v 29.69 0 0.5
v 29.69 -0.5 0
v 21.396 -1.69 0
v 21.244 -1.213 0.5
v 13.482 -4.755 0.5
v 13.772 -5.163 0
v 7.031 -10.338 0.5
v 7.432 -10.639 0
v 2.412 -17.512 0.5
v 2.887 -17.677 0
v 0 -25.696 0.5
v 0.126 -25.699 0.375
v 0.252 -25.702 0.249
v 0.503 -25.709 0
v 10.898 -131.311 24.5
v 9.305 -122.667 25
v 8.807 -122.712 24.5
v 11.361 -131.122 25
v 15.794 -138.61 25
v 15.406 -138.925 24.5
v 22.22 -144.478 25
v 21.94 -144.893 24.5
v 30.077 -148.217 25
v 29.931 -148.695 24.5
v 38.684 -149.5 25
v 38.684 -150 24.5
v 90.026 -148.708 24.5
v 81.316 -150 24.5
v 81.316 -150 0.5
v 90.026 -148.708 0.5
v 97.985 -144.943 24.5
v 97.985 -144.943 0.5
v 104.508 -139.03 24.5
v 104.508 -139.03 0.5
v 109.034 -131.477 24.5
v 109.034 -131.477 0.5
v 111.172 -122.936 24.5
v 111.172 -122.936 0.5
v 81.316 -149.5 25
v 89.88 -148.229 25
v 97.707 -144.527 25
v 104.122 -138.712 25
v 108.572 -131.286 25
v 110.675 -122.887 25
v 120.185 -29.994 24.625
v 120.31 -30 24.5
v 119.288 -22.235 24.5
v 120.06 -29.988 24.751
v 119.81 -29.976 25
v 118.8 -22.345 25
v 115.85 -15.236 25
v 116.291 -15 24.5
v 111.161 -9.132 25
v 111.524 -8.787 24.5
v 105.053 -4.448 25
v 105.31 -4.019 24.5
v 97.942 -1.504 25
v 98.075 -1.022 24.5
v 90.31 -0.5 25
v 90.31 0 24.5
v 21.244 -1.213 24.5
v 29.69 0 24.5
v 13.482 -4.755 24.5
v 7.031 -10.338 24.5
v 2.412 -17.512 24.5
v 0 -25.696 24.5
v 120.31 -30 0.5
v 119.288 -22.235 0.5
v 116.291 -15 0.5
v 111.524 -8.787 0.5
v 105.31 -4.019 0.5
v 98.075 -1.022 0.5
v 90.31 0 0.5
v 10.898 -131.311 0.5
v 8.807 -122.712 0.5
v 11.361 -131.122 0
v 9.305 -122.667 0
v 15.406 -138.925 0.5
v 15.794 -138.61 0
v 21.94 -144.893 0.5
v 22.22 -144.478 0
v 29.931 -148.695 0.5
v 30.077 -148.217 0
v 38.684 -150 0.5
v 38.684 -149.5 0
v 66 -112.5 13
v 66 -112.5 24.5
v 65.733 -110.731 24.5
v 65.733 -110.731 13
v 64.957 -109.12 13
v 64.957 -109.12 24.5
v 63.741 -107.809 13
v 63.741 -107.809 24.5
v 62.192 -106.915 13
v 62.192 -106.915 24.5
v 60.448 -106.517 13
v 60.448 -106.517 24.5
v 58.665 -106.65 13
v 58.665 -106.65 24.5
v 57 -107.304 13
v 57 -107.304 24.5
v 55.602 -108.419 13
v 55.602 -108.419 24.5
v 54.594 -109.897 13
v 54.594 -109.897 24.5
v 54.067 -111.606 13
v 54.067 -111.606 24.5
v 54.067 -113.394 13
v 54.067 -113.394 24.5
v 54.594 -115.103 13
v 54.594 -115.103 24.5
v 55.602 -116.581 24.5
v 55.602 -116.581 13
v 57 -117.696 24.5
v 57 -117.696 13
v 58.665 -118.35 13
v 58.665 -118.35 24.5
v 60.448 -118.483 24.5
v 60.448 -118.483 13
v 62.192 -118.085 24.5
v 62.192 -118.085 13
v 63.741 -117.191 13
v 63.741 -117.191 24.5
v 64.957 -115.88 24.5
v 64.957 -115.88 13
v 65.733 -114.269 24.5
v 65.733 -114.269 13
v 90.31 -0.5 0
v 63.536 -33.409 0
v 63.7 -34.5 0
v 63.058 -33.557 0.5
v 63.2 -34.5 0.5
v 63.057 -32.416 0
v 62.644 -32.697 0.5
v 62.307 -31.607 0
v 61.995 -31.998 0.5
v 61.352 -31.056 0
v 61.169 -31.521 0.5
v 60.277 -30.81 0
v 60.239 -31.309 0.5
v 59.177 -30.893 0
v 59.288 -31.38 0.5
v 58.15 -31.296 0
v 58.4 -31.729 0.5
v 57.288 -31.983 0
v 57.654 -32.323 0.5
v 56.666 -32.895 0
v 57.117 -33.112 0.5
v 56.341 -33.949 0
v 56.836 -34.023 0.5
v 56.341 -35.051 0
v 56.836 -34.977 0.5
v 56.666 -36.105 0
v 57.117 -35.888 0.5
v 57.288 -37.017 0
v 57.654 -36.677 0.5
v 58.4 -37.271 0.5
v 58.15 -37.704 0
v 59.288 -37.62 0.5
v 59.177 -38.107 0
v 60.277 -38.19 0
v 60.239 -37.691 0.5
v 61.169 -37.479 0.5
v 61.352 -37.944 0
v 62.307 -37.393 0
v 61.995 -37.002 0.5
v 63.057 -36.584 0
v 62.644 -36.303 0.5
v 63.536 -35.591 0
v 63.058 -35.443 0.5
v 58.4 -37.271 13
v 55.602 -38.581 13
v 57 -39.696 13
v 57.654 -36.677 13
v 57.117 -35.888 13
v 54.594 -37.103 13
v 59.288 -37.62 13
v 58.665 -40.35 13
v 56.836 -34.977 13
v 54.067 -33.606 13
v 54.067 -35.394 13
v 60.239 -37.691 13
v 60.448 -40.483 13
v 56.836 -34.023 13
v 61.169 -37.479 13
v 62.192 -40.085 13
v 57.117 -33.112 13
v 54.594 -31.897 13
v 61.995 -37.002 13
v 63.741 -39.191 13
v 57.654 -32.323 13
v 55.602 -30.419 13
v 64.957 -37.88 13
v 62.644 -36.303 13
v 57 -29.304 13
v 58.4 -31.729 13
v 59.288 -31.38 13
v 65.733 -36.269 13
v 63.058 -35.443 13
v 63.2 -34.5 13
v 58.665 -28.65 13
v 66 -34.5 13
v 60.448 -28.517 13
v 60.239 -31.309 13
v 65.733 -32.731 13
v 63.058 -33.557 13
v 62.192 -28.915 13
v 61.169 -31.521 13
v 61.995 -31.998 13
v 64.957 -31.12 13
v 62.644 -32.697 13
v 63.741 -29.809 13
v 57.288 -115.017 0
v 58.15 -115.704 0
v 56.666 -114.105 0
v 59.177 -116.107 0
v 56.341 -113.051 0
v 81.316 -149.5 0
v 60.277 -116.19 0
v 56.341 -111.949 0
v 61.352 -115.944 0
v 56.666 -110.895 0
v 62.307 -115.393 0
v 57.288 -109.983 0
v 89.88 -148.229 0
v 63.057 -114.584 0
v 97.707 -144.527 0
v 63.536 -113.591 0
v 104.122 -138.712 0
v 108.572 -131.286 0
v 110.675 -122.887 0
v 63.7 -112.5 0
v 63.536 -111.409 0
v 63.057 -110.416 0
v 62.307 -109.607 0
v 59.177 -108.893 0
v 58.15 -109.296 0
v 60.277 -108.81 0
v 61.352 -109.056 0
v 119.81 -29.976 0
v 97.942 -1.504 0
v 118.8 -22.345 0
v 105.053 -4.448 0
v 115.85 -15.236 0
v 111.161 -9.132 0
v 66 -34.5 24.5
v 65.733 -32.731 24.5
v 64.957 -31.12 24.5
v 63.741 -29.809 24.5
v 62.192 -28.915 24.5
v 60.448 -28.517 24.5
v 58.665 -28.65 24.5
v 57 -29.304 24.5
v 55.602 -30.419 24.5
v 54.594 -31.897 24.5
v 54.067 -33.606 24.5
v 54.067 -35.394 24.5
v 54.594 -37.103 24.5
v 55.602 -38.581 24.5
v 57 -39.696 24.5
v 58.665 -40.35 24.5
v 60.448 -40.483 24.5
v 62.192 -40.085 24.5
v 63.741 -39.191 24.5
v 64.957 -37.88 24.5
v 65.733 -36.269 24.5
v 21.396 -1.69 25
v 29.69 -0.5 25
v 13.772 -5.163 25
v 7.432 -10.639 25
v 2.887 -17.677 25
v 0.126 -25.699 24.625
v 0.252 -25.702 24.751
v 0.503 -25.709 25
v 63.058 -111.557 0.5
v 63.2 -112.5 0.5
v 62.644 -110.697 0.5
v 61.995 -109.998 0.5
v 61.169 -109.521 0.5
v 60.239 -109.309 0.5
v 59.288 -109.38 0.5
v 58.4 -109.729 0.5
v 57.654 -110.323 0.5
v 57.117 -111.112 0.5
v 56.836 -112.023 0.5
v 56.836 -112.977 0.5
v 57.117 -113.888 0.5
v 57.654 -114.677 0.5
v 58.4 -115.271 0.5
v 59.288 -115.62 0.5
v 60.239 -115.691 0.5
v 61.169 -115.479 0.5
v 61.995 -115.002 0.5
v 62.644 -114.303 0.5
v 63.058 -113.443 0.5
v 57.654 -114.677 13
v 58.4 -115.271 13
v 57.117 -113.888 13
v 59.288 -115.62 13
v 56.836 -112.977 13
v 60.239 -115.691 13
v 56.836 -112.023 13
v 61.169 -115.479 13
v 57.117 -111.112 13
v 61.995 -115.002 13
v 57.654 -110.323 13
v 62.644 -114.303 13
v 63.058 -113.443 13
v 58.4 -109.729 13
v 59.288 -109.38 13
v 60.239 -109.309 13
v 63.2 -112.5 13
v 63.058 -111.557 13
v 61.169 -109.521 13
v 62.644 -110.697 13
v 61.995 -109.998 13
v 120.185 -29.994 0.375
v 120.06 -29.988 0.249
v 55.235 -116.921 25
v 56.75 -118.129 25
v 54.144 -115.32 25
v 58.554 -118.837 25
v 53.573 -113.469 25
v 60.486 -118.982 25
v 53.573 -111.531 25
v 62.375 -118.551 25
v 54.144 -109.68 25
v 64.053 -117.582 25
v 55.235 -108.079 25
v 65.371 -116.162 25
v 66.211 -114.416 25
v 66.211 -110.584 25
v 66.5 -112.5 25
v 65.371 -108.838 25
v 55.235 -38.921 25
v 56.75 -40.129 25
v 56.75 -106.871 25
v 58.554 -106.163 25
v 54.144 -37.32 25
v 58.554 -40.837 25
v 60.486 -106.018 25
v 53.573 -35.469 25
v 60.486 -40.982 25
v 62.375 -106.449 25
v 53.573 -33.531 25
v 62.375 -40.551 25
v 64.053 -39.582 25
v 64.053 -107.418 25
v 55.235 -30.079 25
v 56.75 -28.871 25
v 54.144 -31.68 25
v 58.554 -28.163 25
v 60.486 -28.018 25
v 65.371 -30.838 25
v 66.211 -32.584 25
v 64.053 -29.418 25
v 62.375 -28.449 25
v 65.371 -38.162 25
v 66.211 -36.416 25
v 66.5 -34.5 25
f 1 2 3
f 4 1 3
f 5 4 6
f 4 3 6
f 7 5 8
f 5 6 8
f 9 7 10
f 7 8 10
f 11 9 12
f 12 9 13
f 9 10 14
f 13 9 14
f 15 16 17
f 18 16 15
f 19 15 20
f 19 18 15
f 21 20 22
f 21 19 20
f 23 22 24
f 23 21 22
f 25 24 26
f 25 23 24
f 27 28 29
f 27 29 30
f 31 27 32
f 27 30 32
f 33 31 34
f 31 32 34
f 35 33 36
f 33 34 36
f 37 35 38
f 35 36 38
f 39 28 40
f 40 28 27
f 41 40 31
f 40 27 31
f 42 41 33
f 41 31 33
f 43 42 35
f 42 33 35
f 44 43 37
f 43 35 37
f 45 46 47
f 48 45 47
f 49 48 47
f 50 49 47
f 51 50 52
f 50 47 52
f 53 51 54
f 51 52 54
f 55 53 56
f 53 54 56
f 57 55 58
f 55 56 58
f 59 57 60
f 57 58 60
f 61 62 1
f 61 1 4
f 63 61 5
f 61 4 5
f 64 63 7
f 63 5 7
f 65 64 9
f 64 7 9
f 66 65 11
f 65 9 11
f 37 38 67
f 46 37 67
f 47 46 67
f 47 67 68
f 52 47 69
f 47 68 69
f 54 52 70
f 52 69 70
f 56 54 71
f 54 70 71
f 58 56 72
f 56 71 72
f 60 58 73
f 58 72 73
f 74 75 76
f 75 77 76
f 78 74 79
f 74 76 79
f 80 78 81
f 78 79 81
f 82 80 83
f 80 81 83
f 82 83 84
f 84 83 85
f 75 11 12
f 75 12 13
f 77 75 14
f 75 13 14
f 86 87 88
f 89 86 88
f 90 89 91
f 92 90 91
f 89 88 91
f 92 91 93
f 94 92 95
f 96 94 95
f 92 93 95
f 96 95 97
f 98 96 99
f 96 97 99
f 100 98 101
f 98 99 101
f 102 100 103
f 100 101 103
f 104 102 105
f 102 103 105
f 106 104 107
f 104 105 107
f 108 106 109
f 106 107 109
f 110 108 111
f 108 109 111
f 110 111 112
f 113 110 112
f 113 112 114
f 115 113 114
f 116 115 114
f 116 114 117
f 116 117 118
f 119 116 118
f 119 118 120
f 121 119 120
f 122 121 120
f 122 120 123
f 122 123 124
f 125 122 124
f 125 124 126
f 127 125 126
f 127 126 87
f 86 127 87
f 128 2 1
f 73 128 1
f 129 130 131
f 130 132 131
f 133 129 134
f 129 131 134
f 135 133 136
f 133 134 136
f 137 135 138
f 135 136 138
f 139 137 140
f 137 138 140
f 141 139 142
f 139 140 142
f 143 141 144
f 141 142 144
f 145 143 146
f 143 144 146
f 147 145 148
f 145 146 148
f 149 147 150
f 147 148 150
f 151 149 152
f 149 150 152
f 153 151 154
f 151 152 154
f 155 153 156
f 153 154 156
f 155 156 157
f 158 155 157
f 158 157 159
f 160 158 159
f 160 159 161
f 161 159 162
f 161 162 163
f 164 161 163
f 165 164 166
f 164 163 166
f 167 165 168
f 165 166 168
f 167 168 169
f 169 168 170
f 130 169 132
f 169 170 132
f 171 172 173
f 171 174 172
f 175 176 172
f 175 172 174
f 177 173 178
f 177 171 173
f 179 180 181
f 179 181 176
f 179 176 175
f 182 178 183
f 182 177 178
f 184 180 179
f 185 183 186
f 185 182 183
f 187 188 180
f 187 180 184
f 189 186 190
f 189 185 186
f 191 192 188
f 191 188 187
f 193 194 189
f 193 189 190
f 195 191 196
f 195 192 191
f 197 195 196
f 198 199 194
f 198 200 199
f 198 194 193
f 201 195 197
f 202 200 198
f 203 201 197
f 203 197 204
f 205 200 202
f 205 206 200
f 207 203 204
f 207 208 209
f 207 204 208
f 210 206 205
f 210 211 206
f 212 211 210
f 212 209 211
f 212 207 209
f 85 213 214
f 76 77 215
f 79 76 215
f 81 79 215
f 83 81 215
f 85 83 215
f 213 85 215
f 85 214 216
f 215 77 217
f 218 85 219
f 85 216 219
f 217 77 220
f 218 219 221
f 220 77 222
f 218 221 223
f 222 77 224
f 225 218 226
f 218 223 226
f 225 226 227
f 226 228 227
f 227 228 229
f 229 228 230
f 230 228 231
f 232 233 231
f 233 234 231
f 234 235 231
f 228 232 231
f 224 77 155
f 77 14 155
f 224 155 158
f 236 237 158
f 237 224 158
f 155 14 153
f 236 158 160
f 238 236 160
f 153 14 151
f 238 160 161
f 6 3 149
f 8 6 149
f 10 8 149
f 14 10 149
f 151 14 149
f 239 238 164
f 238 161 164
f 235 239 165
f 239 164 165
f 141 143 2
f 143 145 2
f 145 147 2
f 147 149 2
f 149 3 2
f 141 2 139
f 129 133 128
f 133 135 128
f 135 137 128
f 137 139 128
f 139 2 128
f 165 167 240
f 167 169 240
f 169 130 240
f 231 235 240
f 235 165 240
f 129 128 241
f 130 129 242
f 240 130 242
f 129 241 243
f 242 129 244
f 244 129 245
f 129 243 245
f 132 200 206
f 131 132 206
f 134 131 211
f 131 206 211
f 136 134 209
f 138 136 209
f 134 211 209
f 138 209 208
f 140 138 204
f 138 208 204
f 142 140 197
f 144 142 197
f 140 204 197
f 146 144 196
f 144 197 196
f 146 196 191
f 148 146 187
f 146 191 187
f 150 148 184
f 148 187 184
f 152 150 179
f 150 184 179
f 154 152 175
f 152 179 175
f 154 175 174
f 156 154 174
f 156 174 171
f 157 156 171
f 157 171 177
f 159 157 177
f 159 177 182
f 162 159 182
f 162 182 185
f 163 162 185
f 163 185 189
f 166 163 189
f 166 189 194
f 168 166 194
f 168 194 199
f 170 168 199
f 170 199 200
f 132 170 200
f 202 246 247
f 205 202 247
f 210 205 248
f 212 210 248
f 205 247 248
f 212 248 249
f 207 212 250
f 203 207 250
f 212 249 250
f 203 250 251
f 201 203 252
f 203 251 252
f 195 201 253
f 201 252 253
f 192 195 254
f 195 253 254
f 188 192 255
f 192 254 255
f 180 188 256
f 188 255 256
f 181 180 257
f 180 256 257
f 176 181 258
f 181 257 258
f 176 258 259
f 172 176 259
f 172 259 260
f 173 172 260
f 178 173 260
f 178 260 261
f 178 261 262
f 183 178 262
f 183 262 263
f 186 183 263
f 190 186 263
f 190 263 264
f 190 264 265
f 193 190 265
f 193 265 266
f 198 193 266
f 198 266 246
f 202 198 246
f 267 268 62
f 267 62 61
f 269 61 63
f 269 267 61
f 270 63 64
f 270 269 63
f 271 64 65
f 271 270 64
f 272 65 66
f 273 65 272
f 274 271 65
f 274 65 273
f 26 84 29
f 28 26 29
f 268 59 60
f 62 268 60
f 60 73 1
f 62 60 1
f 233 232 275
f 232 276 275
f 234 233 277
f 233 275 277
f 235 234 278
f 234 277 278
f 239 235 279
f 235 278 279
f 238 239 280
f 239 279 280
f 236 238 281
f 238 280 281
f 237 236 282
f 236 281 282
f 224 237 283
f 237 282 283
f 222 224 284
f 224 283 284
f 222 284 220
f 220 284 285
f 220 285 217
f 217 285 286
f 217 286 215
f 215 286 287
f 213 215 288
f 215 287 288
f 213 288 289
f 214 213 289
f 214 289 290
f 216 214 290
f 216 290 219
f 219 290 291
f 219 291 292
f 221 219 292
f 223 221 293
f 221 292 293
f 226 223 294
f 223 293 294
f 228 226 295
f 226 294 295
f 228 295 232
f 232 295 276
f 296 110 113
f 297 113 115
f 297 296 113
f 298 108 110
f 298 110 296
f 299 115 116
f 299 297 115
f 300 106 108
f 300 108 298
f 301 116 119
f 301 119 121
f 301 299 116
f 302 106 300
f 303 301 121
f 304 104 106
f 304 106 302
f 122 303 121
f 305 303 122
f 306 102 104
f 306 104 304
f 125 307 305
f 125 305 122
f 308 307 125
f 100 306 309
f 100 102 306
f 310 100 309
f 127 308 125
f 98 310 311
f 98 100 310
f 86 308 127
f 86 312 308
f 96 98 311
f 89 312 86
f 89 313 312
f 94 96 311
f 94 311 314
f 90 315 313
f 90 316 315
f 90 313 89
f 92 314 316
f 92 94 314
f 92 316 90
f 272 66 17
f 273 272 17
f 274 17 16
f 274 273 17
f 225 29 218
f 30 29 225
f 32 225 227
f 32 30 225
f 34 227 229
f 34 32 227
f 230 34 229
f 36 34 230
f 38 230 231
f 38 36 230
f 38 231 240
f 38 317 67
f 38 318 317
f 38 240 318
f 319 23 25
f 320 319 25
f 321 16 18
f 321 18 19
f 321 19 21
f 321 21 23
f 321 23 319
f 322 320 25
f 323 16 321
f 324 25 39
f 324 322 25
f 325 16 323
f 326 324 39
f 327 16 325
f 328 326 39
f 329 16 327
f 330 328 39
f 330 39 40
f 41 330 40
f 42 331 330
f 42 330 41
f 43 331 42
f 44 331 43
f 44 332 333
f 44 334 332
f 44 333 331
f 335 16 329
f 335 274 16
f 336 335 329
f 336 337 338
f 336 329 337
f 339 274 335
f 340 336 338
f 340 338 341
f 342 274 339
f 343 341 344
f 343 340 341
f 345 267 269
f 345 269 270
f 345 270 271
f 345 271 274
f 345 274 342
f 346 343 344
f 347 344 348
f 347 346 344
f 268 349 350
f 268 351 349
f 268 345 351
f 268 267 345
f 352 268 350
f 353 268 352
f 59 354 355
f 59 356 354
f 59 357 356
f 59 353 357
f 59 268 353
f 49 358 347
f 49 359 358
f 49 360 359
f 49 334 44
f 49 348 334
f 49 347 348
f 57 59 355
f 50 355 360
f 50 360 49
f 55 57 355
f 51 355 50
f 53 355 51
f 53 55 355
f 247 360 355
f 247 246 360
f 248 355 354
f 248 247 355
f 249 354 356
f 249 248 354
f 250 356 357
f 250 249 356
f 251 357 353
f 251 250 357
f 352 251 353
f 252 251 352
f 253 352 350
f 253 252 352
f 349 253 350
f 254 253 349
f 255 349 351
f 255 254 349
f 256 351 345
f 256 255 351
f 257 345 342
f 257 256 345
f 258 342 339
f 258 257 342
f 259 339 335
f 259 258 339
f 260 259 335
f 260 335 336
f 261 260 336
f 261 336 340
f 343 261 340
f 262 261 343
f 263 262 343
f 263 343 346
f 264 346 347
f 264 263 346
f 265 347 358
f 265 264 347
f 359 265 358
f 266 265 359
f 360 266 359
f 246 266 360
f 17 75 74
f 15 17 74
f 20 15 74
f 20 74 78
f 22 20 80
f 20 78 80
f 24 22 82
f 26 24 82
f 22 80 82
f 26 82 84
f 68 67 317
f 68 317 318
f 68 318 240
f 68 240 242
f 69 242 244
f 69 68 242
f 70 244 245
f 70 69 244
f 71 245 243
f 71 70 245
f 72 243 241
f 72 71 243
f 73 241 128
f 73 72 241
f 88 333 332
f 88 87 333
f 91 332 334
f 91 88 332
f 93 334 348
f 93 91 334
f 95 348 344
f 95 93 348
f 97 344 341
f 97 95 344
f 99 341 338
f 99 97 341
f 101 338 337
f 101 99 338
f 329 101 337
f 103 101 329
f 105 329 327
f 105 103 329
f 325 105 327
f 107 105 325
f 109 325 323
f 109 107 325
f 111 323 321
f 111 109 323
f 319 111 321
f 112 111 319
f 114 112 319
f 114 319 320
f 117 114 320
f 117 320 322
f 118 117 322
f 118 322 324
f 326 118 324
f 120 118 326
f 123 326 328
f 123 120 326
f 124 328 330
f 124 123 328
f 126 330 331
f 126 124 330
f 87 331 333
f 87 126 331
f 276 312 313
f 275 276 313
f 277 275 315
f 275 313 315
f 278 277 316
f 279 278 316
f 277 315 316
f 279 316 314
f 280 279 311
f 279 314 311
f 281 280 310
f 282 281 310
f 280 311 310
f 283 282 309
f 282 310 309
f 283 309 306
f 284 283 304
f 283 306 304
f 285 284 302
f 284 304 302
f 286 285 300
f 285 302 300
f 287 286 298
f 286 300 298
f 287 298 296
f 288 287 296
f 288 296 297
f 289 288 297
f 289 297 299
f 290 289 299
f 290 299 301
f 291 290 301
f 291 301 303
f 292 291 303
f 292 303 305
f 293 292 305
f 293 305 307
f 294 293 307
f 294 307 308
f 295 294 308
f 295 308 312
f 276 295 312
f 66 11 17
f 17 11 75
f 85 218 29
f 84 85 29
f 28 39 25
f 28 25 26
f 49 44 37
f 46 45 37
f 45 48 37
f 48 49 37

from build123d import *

# Parameters (mm, degrees)
BOSS_EXTRUDE1_DEPTH = 25
SKETCH4_R           = 6
CUT_EXTRUDE1_DEPTH  = 12
SKETCH5_R           = 3.2
CUT_EXTRUDE2_DEPTH  = 193.726734542
CHAMFER1_SIZE       = 0.5


with BuildPart() as part:
    # Sketch3 → Boss-Extrude1 (new body)
    with BuildSketch(Plane.XY):
        with BuildLine():
            Line((0, -25.695570819), (8.806669266, -122.712097135))
            ThreePointArc((8.806669266, -122.712097135), (18.452204227, -142.151330818), (38.683826579, -150))
            Line((38.683826579, -150), (81.316173421, -150))
            ThreePointArc((81.316173421, -150), (101.46473628, -142.226907448), (111.172189547, -122.935694313))
            Line((111.172189547, -122.935694313), (120.310407726, -30))
            ThreePointArc((120.310407726, -30), (111.523611161, -8.786796564), (90.310407726, 0))
            Line((90.310407726, 0), (29.689592274, 0))
            ThreePointArc((29.689592274, 0), (10.057130323, -7.315943094), (0, -25.695570819))
        make_face()
    extrude(amount=BOSS_EXTRUDE1_DEPTH)

    # Sketch4 → Cut-Extrude1 (cut)
    with BuildSketch(Plane.XY.offset(25)):
        with Locations((60, -34.5)):
            Circle(SKETCH4_R)
        with Locations((60, -112.5)):
            Circle(SKETCH4_R)
    extrude(amount=-CUT_EXTRUDE1_DEPTH, mode=Mode.SUBTRACT)

    # Sketch5 → Cut-Extrude2 (cut, through all)
    with BuildSketch(Plane.XY.offset(13)):
        with Locations((60, -34.5)):
            Circle(SKETCH5_R)
        with Locations((60, -112.5)):
            Circle(SKETCH5_R)
    extrude(amount=-CUT_EXTRUDE2_DEPTH, mode=Mode.SUBTRACT)

    # Chamfer1
    # the kernel refuses this chamfer: 0.5 mm, written as the material it takes off along each edge
    with BuildSketch(Plane(origin=(81.316173421, -120, 0), x_dir=(0, -1, 0), z_dir=(-1, 0, 0))) as chamfer1_piece_1:
        Polygon((30 - CHAMFER1_SIZE, 0), (30, CHAMFER1_SIZE), (30, 0), align=None)
    revolve(axis=Axis((81.316173421, -120, 0), (0, 0, 1)), revolution_arc=84.384249791, mode=Mode.SUBTRACT)
    with BuildSketch(Plane(origin=(38.683826579, -150, 0), x_dir=(0, 0.9996219169112968, -0.027495876610586483), z_dir=(1, 0, 0))) as chamfer1_piece_2:
        Polygon((CHAMFER1_SIZE * 0.999621916911, CHAMFER1_SIZE * 0.0274958766106), (-CHAMFER1_SIZE * 0.0274958766106, CHAMFER1_SIZE * 0.999621916911), (0, 0), align=None)
    extrude(amount=42.632346842, mode=Mode.SUBTRACT)
    with BuildSketch(Plane(origin=(38.683826579, -120, 0), x_dir=(-0.9959052437808521, -0.09040323782808642, 0), z_dir=(-0.09040323782808642, 0.9959052437808521, 0))) as chamfer1_piece_3:
        Polygon((30, CHAMFER1_SIZE), (30 - CHAMFER1_SIZE, 0), (30, 0), align=None)
    revolve(axis=Axis((38.683826579, -120, 0), (0, 0, 1)), revolution_arc=84.813194516, mode=Mode.SUBTRACT)
    with BuildSketch(Plane(origin=(-0.116244234, -24.414994532, 0), x_dir=(-0.027383287698834344, -0.0024857162725187313, 0.9996219169112968), z_dir=(0.09040323782809233, -0.9959052437808515, 0))) as chamfer1_piece_4:
        Polygon((CHAMFER1_SIZE * 0.999621916911, -CHAMFER1_SIZE * 0.0274958766106), (-CHAMFER1_SIZE * 0.0274958766106, -CHAMFER1_SIZE * 0.999621916911), (0, 0), align=None)
    extrude(amount=98.701260202, mode=Mode.SUBTRACT)
    with BuildSketch(Plane(origin=(38.683826579, -150, 25), x_dir=(0, 0.9996219169112968, 0.027495876610589196), z_dir=(1, 0, 0))) as chamfer1_piece_5:
        Polygon((CHAMFER1_SIZE * 0.999621916911, -CHAMFER1_SIZE * 0.0274958766106), (-CHAMFER1_SIZE * 0.0274958766106, -CHAMFER1_SIZE * 0.999621916911), (0, 0), align=None)
    extrude(amount=42.632346842, mode=Mode.SUBTRACT)
    with BuildSketch(Plane(origin=(81.316173421, -120, 25), x_dir=(0, -1, 0), z_dir=(-1, 0, 0))) as chamfer1_piece_6:
        Polygon((30 - CHAMFER1_SIZE, 0), (30, -CHAMFER1_SIZE), (30, 0), align=None)
    revolve(axis=Axis((81.316173421, -120, 25), (0, 0, 1)), revolution_arc=84.384249791, mode=Mode.SUBTRACT)
    with BuildSketch(Plane(origin=(111.172189547, -122.935694313, 25), x_dir=(-0.9948242690303891, 0.09781947923377807, 0.027495876610589255), z_dir=(0.09785647711289452, 0.9952005375234951, 0))) as chamfer1_piece_7:
        Polygon((CHAMFER1_SIZE * 0.999621916911, -CHAMFER1_SIZE * 0.0274958766106), (-CHAMFER1_SIZE * 0.0274958766106, -CHAMFER1_SIZE * 0.999621916911), (0, 0), align=None)
    extrude(amount=94.669728268, mode=Mode.SUBTRACT)
    with BuildSketch(Plane(origin=(90.310407726, -30, 25), x_dir=(0.9990808536319631, -0.04286546285796977, 0), z_dir=(-0.04286546285796977, -0.9990808536319631, 0))) as chamfer1_piece_8:
        Polygon((30 - CHAMFER1_SIZE, 0), (30, -CHAMFER1_SIZE), (30, 0), align=None)
    revolve(axis=Axis((90.310407726, -30, 25), (0, 0, 1)), revolution_arc=92.456762863, mode=Mode.SUBTRACT)
    with BuildSketch(Plane(origin=(60, -34.5, 25), x_dir=(1, 0, 0), z_dir=(0, -1, 0))) as chamfer1_piece_9:
        Polygon((6 + CHAMFER1_SIZE, 0), (6, -CHAMFER1_SIZE), (6, 0), align=None)
    revolve(axis=Axis((60, -34.5, 25), (0, 0, 1)), mode=Mode.SUBTRACT)
    with BuildSketch(Plane(origin=(90.310407726, 0, 25), x_dir=(0, -0.9996219169112968, 0.027495876610589425), z_dir=(-1, 0, 0))) as chamfer1_piece_10:
        Polygon((CHAMFER1_SIZE * 0.999621916911, -CHAMFER1_SIZE * 0.0274958766106), (-CHAMFER1_SIZE * 0.0274958766106, -CHAMFER1_SIZE * 0.999621916911), (0, 0), align=None)
    extrude(amount=60.620815451, mode=Mode.SUBTRACT)
    with BuildSketch(Plane(origin=(60, -112.5, 25), x_dir=(1, 0, 0), z_dir=(0, -1, 0))) as chamfer1_piece_11:
        Polygon((6 + CHAMFER1_SIZE, 0), (6, -CHAMFER1_SIZE), (6, 0), align=None)
    revolve(axis=Axis((60, -112.5, 25), (0, 0, 1)), mode=Mode.SUBTRACT)
    with BuildSketch(Plane(origin=(29.689592274, -30, 25), x_dir=(0, 1, 0), z_dir=(1, 0, 0))) as chamfer1_piece_12:
        Polygon((30, -CHAMFER1_SIZE), (30 - CHAMFER1_SIZE, 0), (30, 0), align=None)
    revolve(axis=Axis((29.689592274, -30, 25), (0, 0, 1)), revolution_arc=84.2072647, mode=Mode.SUBTRACT)
    with BuildSketch(Plane(origin=(60, -34.5, 0), x_dir=(1, 0, 0), z_dir=(0, -1, 0))) as chamfer1_piece_13:
        Polygon((3.2 + CHAMFER1_SIZE, 0), (3.2, CHAMFER1_SIZE), (3.2, 0), align=None)
    revolve(axis=Axis((60, -34.5, 0), (0, 0, 1)), mode=Mode.SUBTRACT)
    with BuildSketch(Plane(origin=(60, -112.5, 0), x_dir=(1, 0, 0), z_dir=(0, -1, 0))) as chamfer1_piece_14:
        Polygon((3.2 + CHAMFER1_SIZE, 0), (3.2, CHAMFER1_SIZE), (3.2, 0), align=None)
    revolve(axis=Axis((60, -112.5, 0), (0, 0, 1)), mode=Mode.SUBTRACT)
    with BuildSketch(Plane(origin=(-0.116244234, -24.414994532, 25), x_dir=(-0.027383287698834274, -0.002485716272518725, -0.9996219169112968), z_dir=(0.09040323782809233, -0.9959052437808515, 0))) as chamfer1_piece_15:
        Polygon((CHAMFER1_SIZE * 0.999621916911, CHAMFER1_SIZE * 0.0274958766106), (-CHAMFER1_SIZE * 0.0274958766106, CHAMFER1_SIZE * 0.999621916911), (0, 0), align=None)
    extrude(amount=98.701260202, mode=Mode.SUBTRACT)
    with BuildSketch(Plane(origin=(29.689592274, -30, 0), x_dir=(0, 1, 0), z_dir=(1, 0, 0))) as chamfer1_piece_16:
        Polygon((30, CHAMFER1_SIZE), (30 - CHAMFER1_SIZE, 0), (30, 0), align=None)
    revolve(axis=Axis((29.689592274, -30, 0), (0, 0, 1)), revolution_arc=84.2072647, mode=Mode.SUBTRACT)
    with BuildSketch(Plane(origin=(38.683826579, -120, 25), x_dir=(-0.9959052437808521, -0.09040323782808642, 0), z_dir=(-0.09040323782808642, 0.9959052437808521, 0))) as chamfer1_piece_17:
        Polygon((30, -CHAMFER1_SIZE), (30 - CHAMFER1_SIZE, 0), (30, 0), align=None)
    revolve(axis=Axis((38.683826579, -120, 25), (0, 0, 1)), revolution_arc=84.813194516, mode=Mode.SUBTRACT)
    with BuildSketch(Plane(origin=(90.310407726, 0, 0), x_dir=(0, -0.9996219169112968, -0.027495876610586893), z_dir=(-1, 0, 0))) as chamfer1_piece_18:
        Polygon((CHAMFER1_SIZE * 0.999621916911, CHAMFER1_SIZE * 0.0274958766106), (-CHAMFER1_SIZE * 0.0274958766106, CHAMFER1_SIZE * 0.999621916911), (0, 0), align=None)
    extrude(amount=60.620815451, mode=Mode.SUBTRACT)
    with BuildSketch(Plane(origin=(90.310407726, -30, 0), x_dir=(0.9990808536319631, -0.04286546285796977, 0), z_dir=(-0.04286546285796977, -0.9990808536319631, 0))) as chamfer1_piece_19:
        Polygon((30 - CHAMFER1_SIZE, 0), (30, CHAMFER1_SIZE), (30, 0), align=None)
    revolve(axis=Axis((90.310407726, -30, 0), (0, 0, 1)), revolution_arc=92.456762863, mode=Mode.SUBTRACT)
    with BuildSketch(Plane(origin=(111.172189547, -122.935694313, 0), x_dir=(-0.9948242690303891, 0.09781947923377807, -0.02749587661058666), z_dir=(0.09785647711289452, 0.9952005375234951, 0))) as chamfer1_piece_20:
        Polygon((CHAMFER1_SIZE * 0.999621916911, CHAMFER1_SIZE * 0.0274958766106), (-CHAMFER1_SIZE * 0.0274958766106, CHAMFER1_SIZE * 0.999621916911), (0, 0), align=None)
    extrude(amount=94.669728268, mode=Mode.SUBTRACT)


solid = part.part
